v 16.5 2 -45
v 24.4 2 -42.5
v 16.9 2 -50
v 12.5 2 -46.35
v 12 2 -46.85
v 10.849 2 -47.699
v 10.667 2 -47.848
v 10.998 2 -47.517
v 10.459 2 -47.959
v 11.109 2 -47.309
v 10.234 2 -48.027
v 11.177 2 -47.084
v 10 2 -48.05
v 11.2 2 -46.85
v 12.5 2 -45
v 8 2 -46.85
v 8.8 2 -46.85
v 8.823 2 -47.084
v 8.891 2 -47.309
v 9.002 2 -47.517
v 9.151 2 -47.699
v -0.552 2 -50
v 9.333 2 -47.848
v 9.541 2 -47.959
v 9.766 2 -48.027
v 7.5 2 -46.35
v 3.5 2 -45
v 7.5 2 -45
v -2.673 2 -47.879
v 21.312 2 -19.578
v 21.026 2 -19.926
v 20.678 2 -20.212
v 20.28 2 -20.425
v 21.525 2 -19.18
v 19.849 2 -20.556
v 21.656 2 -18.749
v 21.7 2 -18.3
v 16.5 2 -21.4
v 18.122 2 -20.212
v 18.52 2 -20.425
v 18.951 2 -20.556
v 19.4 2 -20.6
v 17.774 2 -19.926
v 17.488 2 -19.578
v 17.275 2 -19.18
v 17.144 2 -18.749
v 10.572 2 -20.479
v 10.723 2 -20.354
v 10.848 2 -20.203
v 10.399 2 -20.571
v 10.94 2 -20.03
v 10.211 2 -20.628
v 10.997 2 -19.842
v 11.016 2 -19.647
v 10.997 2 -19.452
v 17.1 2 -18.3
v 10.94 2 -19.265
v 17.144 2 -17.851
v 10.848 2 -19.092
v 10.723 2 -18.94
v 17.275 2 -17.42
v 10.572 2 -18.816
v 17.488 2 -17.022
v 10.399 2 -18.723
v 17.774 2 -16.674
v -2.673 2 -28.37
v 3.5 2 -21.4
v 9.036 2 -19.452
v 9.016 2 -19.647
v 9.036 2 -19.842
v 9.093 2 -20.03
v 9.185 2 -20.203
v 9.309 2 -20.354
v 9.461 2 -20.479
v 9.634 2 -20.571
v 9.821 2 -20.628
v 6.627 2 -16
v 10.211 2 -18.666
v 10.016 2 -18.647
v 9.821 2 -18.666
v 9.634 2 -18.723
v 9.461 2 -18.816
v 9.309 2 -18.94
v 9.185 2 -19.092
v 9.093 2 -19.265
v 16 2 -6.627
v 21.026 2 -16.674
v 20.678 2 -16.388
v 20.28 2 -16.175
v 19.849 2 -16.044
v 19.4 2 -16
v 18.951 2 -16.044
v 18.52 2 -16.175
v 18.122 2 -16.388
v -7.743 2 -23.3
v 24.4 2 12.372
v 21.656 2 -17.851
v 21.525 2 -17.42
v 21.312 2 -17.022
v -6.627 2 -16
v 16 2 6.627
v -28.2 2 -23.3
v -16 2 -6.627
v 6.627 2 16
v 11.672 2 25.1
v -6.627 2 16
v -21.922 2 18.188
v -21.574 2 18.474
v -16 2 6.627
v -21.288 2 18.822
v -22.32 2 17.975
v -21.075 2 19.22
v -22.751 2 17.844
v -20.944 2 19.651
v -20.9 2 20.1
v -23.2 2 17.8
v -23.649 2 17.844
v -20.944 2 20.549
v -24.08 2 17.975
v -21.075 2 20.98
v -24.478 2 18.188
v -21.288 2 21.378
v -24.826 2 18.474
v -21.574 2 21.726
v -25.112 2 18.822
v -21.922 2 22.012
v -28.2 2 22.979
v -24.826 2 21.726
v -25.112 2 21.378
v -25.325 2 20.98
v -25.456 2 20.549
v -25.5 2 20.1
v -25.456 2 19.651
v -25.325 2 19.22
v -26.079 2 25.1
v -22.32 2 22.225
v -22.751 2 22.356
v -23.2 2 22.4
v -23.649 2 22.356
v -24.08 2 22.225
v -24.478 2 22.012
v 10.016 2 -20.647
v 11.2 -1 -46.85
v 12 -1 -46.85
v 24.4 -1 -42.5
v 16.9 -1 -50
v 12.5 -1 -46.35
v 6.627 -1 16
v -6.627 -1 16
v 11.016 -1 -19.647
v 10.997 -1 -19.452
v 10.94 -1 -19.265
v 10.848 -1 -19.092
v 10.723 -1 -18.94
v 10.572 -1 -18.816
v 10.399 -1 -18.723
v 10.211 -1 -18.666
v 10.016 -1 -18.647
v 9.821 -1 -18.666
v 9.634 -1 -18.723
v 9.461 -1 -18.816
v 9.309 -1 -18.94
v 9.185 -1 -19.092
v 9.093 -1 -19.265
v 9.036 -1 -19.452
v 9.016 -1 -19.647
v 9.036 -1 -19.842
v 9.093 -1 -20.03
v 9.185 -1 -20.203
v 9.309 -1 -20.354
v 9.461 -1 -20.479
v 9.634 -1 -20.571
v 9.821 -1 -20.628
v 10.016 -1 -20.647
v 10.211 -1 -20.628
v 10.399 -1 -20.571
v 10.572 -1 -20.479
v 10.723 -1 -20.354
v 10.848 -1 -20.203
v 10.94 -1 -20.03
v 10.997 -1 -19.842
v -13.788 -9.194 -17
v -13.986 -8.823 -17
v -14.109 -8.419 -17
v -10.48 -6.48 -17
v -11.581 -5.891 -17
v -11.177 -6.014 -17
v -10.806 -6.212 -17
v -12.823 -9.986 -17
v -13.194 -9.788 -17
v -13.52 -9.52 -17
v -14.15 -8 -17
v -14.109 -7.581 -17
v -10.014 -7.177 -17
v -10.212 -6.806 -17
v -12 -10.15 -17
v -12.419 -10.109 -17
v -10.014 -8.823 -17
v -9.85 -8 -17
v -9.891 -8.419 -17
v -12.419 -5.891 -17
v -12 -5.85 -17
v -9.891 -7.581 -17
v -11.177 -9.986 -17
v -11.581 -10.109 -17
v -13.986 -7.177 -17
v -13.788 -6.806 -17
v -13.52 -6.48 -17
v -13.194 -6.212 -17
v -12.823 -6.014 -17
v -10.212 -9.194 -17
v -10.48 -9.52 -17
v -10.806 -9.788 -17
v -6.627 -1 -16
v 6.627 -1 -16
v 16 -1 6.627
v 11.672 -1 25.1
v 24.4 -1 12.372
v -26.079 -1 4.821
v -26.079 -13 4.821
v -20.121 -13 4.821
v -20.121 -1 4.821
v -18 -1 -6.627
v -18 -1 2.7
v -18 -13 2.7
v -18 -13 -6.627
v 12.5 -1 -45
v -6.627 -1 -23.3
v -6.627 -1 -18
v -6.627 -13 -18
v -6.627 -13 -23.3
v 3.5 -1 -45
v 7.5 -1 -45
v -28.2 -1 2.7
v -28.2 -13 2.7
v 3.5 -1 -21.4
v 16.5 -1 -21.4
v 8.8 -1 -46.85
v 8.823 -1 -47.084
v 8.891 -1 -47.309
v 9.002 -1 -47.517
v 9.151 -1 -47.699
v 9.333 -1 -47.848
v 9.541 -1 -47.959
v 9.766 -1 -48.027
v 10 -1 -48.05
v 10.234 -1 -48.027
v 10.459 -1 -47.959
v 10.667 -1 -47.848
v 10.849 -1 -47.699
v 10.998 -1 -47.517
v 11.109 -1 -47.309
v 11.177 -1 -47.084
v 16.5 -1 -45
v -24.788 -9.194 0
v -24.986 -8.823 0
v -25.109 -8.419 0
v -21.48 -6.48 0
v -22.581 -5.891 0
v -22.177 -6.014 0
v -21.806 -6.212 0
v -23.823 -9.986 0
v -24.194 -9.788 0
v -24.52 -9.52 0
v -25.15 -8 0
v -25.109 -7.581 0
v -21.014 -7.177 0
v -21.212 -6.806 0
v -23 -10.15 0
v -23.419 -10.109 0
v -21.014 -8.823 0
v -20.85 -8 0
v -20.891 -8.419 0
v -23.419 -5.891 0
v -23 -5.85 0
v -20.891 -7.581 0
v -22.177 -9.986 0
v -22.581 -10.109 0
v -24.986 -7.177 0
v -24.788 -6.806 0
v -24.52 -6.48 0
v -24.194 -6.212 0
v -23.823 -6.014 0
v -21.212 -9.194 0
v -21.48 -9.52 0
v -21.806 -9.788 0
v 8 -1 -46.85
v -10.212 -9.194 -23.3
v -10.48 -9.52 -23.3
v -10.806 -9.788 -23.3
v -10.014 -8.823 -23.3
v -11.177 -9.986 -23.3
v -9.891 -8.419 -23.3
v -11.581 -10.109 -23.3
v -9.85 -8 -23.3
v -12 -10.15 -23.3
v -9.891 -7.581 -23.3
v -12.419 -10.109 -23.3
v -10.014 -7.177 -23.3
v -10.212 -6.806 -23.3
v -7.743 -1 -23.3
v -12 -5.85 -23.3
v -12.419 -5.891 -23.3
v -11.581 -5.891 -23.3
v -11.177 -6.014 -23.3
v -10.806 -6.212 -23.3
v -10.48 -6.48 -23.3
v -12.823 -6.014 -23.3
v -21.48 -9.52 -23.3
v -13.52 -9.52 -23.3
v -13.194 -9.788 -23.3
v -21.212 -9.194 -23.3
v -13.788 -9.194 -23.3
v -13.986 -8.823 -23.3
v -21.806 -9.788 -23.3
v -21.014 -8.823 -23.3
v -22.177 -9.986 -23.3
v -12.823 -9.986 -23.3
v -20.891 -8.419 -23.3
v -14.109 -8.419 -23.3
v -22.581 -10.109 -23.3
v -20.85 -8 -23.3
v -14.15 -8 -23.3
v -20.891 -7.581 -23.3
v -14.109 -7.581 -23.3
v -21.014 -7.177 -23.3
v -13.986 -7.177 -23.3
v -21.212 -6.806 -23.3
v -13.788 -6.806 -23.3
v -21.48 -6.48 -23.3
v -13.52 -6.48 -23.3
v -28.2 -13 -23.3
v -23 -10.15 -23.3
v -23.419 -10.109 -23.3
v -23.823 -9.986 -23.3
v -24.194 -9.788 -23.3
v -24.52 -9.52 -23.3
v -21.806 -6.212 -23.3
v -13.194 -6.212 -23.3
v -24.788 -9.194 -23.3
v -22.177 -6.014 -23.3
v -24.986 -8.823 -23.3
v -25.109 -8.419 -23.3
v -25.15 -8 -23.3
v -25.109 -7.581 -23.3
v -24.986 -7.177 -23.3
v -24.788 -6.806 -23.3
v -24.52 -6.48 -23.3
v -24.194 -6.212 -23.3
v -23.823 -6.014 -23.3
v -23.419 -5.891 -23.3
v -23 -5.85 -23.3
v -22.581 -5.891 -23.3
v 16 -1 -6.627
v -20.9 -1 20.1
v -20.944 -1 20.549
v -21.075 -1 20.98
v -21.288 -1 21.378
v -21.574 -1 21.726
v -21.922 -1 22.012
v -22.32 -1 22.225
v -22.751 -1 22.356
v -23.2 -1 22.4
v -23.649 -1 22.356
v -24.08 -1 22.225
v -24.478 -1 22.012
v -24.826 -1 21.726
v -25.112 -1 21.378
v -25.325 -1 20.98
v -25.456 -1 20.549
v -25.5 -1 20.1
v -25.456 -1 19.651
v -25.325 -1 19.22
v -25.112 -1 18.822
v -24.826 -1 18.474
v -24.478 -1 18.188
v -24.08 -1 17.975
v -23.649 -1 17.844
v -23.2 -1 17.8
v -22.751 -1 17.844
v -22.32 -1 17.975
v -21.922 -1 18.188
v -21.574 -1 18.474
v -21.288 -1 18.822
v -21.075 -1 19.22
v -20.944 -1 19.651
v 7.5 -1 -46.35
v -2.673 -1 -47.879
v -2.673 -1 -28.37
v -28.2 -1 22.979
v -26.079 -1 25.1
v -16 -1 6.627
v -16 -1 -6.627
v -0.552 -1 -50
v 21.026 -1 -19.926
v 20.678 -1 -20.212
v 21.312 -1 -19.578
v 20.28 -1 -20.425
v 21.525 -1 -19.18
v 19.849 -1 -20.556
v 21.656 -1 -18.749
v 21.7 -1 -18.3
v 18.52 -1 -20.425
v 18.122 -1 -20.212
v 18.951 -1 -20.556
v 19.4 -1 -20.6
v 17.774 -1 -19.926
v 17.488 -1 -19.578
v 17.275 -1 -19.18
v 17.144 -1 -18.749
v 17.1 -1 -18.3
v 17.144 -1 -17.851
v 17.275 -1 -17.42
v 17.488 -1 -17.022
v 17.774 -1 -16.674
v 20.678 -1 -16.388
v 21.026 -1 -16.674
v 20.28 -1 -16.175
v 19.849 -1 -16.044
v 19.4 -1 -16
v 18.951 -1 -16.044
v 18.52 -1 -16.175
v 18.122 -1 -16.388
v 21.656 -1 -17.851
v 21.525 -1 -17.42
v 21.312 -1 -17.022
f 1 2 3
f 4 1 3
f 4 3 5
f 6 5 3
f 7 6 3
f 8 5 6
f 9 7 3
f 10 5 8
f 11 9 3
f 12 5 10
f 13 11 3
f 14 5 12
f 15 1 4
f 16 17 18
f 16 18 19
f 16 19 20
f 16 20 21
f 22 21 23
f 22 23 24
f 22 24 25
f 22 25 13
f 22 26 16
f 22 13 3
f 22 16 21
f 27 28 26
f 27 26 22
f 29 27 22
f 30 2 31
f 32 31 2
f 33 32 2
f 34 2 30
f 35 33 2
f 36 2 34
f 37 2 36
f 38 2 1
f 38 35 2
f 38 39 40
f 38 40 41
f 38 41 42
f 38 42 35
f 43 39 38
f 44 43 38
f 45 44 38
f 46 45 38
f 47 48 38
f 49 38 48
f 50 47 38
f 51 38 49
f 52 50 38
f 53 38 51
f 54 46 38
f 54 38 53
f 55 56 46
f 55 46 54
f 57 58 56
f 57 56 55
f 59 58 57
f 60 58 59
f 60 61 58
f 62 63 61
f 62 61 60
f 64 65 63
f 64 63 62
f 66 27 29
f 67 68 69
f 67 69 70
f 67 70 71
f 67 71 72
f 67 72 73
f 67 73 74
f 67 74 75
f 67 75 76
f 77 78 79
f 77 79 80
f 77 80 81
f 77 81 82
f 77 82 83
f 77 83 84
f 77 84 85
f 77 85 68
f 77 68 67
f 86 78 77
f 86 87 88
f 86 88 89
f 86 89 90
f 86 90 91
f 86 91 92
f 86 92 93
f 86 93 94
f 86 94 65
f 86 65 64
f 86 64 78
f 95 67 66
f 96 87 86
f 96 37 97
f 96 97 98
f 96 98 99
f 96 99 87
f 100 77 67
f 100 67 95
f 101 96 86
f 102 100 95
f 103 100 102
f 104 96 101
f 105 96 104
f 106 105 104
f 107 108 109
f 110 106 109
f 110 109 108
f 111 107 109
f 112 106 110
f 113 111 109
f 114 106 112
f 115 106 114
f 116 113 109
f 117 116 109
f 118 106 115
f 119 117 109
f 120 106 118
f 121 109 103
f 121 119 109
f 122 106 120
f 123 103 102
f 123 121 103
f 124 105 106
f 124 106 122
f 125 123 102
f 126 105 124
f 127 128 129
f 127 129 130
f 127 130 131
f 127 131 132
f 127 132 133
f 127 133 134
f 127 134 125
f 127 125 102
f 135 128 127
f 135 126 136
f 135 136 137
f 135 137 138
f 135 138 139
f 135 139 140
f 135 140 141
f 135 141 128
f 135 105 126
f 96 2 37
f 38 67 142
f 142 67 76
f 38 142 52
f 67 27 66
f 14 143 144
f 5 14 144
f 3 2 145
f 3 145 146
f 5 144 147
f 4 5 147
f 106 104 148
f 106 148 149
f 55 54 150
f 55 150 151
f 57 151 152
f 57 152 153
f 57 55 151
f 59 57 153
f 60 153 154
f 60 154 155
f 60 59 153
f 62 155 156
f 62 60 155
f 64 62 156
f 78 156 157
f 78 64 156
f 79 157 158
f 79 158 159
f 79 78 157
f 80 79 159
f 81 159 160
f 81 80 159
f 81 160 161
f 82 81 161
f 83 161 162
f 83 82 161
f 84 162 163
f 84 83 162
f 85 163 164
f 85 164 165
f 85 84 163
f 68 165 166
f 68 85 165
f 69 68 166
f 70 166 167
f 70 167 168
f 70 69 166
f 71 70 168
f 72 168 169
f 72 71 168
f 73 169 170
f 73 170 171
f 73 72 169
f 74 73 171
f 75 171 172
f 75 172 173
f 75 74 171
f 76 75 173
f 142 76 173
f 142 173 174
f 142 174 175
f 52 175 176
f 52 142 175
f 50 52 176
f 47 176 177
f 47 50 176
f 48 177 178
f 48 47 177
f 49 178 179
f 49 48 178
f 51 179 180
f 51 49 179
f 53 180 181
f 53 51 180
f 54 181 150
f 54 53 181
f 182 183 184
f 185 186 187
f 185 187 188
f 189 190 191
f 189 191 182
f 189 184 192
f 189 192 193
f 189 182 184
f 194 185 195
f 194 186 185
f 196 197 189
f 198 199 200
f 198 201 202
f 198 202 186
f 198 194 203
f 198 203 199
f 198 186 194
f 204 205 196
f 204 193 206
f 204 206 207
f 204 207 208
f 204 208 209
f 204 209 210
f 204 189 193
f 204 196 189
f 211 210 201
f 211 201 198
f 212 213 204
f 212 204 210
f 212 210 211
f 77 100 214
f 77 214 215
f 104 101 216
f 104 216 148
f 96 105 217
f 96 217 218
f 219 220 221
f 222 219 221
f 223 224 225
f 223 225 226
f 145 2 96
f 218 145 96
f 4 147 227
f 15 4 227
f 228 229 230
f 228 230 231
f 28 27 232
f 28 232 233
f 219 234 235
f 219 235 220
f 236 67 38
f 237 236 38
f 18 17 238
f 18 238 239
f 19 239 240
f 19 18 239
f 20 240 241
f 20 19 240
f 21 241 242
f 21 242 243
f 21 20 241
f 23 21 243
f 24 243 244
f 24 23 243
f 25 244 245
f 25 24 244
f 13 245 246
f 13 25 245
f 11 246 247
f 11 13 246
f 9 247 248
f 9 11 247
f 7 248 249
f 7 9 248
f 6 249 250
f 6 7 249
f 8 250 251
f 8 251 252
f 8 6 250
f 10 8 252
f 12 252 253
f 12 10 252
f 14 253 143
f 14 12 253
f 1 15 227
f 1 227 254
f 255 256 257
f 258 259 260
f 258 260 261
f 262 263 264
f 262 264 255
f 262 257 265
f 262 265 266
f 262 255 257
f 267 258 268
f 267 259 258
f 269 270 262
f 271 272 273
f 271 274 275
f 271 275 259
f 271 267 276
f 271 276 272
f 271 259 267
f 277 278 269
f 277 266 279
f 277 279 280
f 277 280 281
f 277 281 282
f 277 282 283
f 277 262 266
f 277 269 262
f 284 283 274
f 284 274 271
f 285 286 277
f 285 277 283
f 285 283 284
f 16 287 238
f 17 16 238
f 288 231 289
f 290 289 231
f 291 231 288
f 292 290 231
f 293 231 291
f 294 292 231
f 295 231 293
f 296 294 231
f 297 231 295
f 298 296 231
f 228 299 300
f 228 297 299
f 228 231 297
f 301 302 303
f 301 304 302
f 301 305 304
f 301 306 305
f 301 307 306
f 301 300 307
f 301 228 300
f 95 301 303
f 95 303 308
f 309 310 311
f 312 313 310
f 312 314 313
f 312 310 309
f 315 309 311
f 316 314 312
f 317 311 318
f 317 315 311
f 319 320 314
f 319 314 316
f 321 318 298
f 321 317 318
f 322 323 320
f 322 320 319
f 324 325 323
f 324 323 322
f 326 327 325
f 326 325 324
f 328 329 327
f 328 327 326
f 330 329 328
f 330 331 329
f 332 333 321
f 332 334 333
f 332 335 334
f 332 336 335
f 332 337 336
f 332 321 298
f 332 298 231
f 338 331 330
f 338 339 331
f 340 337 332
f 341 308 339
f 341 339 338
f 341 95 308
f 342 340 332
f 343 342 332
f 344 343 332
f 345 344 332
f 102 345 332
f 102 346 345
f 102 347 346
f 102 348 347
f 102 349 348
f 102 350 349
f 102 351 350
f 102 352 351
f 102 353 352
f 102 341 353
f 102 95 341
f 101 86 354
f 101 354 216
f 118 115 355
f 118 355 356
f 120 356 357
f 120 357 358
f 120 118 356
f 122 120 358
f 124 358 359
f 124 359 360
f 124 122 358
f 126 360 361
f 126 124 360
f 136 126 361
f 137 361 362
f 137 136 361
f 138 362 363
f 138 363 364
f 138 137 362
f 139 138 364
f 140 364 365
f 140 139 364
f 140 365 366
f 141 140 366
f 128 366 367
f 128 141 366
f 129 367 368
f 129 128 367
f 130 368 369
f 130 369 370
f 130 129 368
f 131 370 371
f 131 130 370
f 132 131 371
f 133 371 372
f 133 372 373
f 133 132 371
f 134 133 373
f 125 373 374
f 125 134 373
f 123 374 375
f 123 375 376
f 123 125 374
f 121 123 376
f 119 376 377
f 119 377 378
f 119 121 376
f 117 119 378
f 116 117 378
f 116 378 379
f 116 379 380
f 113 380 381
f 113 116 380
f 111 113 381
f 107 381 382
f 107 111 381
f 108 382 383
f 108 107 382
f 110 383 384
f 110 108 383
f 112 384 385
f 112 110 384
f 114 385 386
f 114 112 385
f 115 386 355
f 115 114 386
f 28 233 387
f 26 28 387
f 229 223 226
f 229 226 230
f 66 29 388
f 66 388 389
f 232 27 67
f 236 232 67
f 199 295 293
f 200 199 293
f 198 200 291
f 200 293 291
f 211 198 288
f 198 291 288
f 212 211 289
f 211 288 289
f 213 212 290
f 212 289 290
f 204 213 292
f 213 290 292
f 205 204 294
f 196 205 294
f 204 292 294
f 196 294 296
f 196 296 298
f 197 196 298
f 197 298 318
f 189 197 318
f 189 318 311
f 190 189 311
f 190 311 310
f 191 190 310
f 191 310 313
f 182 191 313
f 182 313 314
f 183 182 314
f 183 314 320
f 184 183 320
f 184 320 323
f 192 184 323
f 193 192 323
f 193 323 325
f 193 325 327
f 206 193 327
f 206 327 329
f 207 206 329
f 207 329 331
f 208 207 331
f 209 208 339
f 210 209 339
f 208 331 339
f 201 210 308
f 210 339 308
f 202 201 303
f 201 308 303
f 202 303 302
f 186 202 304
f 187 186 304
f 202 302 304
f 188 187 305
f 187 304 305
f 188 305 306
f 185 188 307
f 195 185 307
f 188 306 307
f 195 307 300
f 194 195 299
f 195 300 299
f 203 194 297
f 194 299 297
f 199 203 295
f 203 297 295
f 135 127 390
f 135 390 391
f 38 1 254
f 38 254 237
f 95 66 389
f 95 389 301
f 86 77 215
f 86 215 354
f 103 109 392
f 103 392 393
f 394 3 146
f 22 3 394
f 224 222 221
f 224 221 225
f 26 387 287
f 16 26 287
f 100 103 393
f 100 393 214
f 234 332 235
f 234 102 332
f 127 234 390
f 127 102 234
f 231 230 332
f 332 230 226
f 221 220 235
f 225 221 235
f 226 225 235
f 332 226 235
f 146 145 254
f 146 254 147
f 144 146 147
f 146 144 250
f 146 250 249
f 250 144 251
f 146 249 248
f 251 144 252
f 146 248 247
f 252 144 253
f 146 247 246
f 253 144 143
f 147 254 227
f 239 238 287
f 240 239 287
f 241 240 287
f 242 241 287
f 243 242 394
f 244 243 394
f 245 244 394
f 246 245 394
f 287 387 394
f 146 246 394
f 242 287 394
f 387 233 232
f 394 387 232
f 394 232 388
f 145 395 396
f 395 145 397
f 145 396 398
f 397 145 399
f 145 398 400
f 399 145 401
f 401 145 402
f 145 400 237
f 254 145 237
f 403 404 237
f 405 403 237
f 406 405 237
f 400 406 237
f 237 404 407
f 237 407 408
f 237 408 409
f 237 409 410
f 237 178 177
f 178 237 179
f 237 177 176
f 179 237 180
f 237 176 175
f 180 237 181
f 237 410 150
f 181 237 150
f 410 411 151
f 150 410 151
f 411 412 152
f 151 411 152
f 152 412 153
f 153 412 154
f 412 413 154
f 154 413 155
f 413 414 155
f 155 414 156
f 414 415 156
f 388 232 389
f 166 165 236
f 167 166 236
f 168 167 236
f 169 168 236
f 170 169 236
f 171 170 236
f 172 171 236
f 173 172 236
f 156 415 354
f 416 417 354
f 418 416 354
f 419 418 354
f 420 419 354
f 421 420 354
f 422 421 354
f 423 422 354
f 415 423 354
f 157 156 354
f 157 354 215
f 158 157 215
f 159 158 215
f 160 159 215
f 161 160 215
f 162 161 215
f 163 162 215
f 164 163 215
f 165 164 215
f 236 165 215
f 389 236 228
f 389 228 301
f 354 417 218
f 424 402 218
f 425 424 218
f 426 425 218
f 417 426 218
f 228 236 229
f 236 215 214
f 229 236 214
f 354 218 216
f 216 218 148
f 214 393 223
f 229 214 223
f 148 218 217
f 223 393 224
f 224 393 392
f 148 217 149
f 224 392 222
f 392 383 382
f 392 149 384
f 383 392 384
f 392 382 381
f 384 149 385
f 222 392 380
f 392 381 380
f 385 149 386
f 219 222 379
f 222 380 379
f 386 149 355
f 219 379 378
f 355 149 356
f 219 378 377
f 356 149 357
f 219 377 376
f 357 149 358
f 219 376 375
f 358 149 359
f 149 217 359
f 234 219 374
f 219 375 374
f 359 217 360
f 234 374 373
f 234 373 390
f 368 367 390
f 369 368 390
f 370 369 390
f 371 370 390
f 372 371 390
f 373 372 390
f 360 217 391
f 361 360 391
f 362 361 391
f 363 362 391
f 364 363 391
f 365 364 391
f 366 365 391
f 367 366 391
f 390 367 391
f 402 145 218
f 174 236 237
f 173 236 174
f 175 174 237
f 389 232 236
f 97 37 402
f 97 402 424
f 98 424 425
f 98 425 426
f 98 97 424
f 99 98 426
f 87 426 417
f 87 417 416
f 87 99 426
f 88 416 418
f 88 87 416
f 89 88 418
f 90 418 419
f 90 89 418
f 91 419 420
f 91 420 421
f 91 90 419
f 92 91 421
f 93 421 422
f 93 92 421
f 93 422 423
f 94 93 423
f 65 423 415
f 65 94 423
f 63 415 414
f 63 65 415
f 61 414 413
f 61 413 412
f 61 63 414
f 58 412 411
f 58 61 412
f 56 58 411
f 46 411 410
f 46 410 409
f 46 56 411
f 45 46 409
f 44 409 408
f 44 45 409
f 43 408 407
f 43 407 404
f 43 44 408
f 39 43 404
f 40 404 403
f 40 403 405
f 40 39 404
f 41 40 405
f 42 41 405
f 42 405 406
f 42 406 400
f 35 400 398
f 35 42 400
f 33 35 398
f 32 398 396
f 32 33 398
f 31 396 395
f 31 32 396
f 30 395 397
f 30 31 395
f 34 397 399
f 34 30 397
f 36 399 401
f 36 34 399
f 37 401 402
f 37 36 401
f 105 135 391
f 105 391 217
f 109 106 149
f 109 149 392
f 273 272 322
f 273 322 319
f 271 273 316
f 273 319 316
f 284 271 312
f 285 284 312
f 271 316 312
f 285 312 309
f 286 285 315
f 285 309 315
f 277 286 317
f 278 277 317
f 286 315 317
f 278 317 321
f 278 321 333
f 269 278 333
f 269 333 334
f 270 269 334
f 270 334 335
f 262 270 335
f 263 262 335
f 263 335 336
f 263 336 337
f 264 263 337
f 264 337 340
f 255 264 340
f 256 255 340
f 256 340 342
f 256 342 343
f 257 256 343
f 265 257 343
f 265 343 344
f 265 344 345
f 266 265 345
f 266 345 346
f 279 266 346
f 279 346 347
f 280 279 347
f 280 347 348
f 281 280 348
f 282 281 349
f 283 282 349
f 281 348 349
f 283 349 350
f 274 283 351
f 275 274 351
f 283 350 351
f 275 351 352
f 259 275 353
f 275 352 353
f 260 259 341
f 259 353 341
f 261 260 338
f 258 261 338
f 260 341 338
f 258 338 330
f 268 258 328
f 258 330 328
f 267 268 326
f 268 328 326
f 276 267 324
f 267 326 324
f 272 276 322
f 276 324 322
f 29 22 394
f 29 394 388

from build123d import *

# Parameters (mm, degrees)
SKETCH_R           = 2.3
SKETCH_R_2         = 1
SKETCH_R_3         = 1.2
SKETCH_W           = 13
SKETCH_H           = 23.6
PAD_DEPTH          = 3
PAD005002_DEPTH    = 12
SKETCH002_R        = 2.15
POCKET_DEPTH       = 24
SKETCH003_R        = 2.15
POCKET002002_DEPTH = 7
POCKET002003_DEPTH = 3.001


with BuildPart() as part:
    # Sketch → Pad (new body)
    with BuildSketch(Plane.XZ):
        Polygon((-26.07868, 25.1), (11.672078, 25.1), (24.4, 12.372078), (24.4, -23.3), (24.4, -42.5), (16.9, -50), (-0.551549, -50), (-2.672869, -47.87868), (-2.672869, -28.369956), (-7.742825, -23.3), (-28.2, -23.3), (-28.2, 22.97868), align=None)
        with Locations((-23.2, 20.1)):
            Circle(SKETCH_R, mode=Mode.SUBTRACT)
        with Locations((19.4, -18.3)):
            Circle(SKETCH_R, mode=Mode.SUBTRACT)
        with Locations((10.01639, -19.647283)):
            Circle(SKETCH_R_2, mode=Mode.SUBTRACT)
        with Locations((10, -46.85)):
            Circle(SKETCH_R_3, mode=Mode.SUBTRACT)
        Polygon((16, 6.627417), (6.627417, 16), (-6.627417, 16), (-16, 6.627417), (-16, -6.627417), (-6.627417, -16), (6.627417, -16), (16, -6.627417), align=None, mode=Mode.SUBTRACT)
        with Locations((10, -33.2)):
            Rectangle(SKETCH_W, SKETCH_H, mode=Mode.SUBTRACT)
    extrude(amount=PAD_DEPTH)

    # Sketch001 (on Face30 of Pad) → Pad005002 (join)
    with BuildSketch(Plane.XZ.offset(3)):
        Polygon((-26.07868, 4.82132), (-20.12132, 4.82132), (-18, 2.7), (-18, -6.627417), (-6.627417, -18), (-6.627417, -23.3), (-28.2, -23.3), (-28.2, 2.7), align=None)
    extrude(amount=PAD005002_DEPTH)

    # Sketch002 (on Face38 of Pad005002) → Pocket (cut)
    with BuildSketch(Plane(origin=(0, 0, -24), x_dir=(1, 0, 0), z_dir=(0, 0, -1))):
        with Locations((-23, 10)):
            Circle(SKETCH002_R)
    extrude(amount=-POCKET_DEPTH, mode=Mode.SUBTRACT)

    # Sketch003 (on Face38 of Pad005002) → Pocket002002 (cut)
    with BuildSketch(Plane(origin=(0, 0, -24), x_dir=(1, 0, 0), z_dir=(0, 0, -1))):
        with Locations((-12, 10)):
            Circle(SKETCH003_R)
    extrude(amount=-POCKET002002_DEPTH, mode=Mode.SUBTRACT)

    # Sketch004 (on Face5 of Pocket002002) → Pocket002003 (cut, through all)
    with BuildSketch(Plane.XZ.offset(3)):
        Polygon((12.5, -43.35), (7.5, -43.35), (7.5, -46.35), (8, -46.85), (10, -46.85), (12, -46.85), (12.5, -46.35), align=None)
    extrude(amount=-POCKET002003_DEPTH, mode=Mode.SUBTRACT)


with BuildPart() as part_1:
    # Body placement: moved
    add(part.part.moved(Location((0, 2, 0))))


solid = part_1.part
